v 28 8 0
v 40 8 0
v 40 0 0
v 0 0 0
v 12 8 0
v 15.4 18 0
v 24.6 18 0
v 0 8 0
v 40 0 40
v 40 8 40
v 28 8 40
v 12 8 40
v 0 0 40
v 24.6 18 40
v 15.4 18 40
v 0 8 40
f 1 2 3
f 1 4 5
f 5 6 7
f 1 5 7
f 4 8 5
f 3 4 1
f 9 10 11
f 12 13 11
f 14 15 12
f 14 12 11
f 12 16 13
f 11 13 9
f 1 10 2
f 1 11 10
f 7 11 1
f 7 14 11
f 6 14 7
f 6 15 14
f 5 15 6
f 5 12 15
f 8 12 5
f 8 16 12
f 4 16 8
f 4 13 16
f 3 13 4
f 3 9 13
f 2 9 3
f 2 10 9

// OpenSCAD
$fn = 32;

// ----------------------------------------------------------------------
// V guide rail: dovetail, 40 mm wide
// ----------------------------------------------------------------------

// --- parameters (mm) ---
rail_w = 40;              // rail width, X
base_t = 8;               // base plate thickness
v_depth = 10;             // V feature depth / height
v_half_w = 8;             // half width of the V at the base face
plate_t = 40;             // rail length, Z (the extrusion height)
top_half_w = 4.6;         // half width at the dovetail top

dovetail_base = 2 * v_half_w;  // dovetail width at the base
dovetail_top = 2 * top_half_w;  // dovetail width at the top

profile = [[0, 0], [40, 0], [40, 8], [28, 8], [24.6, 18], [15.4, 18], [12, 8], [0, 8]];  // primary outline, 8 points, counter clockwise

// --- the one profile operation ---
linear_extrude(height = plate_t) polygon(points = profile);
